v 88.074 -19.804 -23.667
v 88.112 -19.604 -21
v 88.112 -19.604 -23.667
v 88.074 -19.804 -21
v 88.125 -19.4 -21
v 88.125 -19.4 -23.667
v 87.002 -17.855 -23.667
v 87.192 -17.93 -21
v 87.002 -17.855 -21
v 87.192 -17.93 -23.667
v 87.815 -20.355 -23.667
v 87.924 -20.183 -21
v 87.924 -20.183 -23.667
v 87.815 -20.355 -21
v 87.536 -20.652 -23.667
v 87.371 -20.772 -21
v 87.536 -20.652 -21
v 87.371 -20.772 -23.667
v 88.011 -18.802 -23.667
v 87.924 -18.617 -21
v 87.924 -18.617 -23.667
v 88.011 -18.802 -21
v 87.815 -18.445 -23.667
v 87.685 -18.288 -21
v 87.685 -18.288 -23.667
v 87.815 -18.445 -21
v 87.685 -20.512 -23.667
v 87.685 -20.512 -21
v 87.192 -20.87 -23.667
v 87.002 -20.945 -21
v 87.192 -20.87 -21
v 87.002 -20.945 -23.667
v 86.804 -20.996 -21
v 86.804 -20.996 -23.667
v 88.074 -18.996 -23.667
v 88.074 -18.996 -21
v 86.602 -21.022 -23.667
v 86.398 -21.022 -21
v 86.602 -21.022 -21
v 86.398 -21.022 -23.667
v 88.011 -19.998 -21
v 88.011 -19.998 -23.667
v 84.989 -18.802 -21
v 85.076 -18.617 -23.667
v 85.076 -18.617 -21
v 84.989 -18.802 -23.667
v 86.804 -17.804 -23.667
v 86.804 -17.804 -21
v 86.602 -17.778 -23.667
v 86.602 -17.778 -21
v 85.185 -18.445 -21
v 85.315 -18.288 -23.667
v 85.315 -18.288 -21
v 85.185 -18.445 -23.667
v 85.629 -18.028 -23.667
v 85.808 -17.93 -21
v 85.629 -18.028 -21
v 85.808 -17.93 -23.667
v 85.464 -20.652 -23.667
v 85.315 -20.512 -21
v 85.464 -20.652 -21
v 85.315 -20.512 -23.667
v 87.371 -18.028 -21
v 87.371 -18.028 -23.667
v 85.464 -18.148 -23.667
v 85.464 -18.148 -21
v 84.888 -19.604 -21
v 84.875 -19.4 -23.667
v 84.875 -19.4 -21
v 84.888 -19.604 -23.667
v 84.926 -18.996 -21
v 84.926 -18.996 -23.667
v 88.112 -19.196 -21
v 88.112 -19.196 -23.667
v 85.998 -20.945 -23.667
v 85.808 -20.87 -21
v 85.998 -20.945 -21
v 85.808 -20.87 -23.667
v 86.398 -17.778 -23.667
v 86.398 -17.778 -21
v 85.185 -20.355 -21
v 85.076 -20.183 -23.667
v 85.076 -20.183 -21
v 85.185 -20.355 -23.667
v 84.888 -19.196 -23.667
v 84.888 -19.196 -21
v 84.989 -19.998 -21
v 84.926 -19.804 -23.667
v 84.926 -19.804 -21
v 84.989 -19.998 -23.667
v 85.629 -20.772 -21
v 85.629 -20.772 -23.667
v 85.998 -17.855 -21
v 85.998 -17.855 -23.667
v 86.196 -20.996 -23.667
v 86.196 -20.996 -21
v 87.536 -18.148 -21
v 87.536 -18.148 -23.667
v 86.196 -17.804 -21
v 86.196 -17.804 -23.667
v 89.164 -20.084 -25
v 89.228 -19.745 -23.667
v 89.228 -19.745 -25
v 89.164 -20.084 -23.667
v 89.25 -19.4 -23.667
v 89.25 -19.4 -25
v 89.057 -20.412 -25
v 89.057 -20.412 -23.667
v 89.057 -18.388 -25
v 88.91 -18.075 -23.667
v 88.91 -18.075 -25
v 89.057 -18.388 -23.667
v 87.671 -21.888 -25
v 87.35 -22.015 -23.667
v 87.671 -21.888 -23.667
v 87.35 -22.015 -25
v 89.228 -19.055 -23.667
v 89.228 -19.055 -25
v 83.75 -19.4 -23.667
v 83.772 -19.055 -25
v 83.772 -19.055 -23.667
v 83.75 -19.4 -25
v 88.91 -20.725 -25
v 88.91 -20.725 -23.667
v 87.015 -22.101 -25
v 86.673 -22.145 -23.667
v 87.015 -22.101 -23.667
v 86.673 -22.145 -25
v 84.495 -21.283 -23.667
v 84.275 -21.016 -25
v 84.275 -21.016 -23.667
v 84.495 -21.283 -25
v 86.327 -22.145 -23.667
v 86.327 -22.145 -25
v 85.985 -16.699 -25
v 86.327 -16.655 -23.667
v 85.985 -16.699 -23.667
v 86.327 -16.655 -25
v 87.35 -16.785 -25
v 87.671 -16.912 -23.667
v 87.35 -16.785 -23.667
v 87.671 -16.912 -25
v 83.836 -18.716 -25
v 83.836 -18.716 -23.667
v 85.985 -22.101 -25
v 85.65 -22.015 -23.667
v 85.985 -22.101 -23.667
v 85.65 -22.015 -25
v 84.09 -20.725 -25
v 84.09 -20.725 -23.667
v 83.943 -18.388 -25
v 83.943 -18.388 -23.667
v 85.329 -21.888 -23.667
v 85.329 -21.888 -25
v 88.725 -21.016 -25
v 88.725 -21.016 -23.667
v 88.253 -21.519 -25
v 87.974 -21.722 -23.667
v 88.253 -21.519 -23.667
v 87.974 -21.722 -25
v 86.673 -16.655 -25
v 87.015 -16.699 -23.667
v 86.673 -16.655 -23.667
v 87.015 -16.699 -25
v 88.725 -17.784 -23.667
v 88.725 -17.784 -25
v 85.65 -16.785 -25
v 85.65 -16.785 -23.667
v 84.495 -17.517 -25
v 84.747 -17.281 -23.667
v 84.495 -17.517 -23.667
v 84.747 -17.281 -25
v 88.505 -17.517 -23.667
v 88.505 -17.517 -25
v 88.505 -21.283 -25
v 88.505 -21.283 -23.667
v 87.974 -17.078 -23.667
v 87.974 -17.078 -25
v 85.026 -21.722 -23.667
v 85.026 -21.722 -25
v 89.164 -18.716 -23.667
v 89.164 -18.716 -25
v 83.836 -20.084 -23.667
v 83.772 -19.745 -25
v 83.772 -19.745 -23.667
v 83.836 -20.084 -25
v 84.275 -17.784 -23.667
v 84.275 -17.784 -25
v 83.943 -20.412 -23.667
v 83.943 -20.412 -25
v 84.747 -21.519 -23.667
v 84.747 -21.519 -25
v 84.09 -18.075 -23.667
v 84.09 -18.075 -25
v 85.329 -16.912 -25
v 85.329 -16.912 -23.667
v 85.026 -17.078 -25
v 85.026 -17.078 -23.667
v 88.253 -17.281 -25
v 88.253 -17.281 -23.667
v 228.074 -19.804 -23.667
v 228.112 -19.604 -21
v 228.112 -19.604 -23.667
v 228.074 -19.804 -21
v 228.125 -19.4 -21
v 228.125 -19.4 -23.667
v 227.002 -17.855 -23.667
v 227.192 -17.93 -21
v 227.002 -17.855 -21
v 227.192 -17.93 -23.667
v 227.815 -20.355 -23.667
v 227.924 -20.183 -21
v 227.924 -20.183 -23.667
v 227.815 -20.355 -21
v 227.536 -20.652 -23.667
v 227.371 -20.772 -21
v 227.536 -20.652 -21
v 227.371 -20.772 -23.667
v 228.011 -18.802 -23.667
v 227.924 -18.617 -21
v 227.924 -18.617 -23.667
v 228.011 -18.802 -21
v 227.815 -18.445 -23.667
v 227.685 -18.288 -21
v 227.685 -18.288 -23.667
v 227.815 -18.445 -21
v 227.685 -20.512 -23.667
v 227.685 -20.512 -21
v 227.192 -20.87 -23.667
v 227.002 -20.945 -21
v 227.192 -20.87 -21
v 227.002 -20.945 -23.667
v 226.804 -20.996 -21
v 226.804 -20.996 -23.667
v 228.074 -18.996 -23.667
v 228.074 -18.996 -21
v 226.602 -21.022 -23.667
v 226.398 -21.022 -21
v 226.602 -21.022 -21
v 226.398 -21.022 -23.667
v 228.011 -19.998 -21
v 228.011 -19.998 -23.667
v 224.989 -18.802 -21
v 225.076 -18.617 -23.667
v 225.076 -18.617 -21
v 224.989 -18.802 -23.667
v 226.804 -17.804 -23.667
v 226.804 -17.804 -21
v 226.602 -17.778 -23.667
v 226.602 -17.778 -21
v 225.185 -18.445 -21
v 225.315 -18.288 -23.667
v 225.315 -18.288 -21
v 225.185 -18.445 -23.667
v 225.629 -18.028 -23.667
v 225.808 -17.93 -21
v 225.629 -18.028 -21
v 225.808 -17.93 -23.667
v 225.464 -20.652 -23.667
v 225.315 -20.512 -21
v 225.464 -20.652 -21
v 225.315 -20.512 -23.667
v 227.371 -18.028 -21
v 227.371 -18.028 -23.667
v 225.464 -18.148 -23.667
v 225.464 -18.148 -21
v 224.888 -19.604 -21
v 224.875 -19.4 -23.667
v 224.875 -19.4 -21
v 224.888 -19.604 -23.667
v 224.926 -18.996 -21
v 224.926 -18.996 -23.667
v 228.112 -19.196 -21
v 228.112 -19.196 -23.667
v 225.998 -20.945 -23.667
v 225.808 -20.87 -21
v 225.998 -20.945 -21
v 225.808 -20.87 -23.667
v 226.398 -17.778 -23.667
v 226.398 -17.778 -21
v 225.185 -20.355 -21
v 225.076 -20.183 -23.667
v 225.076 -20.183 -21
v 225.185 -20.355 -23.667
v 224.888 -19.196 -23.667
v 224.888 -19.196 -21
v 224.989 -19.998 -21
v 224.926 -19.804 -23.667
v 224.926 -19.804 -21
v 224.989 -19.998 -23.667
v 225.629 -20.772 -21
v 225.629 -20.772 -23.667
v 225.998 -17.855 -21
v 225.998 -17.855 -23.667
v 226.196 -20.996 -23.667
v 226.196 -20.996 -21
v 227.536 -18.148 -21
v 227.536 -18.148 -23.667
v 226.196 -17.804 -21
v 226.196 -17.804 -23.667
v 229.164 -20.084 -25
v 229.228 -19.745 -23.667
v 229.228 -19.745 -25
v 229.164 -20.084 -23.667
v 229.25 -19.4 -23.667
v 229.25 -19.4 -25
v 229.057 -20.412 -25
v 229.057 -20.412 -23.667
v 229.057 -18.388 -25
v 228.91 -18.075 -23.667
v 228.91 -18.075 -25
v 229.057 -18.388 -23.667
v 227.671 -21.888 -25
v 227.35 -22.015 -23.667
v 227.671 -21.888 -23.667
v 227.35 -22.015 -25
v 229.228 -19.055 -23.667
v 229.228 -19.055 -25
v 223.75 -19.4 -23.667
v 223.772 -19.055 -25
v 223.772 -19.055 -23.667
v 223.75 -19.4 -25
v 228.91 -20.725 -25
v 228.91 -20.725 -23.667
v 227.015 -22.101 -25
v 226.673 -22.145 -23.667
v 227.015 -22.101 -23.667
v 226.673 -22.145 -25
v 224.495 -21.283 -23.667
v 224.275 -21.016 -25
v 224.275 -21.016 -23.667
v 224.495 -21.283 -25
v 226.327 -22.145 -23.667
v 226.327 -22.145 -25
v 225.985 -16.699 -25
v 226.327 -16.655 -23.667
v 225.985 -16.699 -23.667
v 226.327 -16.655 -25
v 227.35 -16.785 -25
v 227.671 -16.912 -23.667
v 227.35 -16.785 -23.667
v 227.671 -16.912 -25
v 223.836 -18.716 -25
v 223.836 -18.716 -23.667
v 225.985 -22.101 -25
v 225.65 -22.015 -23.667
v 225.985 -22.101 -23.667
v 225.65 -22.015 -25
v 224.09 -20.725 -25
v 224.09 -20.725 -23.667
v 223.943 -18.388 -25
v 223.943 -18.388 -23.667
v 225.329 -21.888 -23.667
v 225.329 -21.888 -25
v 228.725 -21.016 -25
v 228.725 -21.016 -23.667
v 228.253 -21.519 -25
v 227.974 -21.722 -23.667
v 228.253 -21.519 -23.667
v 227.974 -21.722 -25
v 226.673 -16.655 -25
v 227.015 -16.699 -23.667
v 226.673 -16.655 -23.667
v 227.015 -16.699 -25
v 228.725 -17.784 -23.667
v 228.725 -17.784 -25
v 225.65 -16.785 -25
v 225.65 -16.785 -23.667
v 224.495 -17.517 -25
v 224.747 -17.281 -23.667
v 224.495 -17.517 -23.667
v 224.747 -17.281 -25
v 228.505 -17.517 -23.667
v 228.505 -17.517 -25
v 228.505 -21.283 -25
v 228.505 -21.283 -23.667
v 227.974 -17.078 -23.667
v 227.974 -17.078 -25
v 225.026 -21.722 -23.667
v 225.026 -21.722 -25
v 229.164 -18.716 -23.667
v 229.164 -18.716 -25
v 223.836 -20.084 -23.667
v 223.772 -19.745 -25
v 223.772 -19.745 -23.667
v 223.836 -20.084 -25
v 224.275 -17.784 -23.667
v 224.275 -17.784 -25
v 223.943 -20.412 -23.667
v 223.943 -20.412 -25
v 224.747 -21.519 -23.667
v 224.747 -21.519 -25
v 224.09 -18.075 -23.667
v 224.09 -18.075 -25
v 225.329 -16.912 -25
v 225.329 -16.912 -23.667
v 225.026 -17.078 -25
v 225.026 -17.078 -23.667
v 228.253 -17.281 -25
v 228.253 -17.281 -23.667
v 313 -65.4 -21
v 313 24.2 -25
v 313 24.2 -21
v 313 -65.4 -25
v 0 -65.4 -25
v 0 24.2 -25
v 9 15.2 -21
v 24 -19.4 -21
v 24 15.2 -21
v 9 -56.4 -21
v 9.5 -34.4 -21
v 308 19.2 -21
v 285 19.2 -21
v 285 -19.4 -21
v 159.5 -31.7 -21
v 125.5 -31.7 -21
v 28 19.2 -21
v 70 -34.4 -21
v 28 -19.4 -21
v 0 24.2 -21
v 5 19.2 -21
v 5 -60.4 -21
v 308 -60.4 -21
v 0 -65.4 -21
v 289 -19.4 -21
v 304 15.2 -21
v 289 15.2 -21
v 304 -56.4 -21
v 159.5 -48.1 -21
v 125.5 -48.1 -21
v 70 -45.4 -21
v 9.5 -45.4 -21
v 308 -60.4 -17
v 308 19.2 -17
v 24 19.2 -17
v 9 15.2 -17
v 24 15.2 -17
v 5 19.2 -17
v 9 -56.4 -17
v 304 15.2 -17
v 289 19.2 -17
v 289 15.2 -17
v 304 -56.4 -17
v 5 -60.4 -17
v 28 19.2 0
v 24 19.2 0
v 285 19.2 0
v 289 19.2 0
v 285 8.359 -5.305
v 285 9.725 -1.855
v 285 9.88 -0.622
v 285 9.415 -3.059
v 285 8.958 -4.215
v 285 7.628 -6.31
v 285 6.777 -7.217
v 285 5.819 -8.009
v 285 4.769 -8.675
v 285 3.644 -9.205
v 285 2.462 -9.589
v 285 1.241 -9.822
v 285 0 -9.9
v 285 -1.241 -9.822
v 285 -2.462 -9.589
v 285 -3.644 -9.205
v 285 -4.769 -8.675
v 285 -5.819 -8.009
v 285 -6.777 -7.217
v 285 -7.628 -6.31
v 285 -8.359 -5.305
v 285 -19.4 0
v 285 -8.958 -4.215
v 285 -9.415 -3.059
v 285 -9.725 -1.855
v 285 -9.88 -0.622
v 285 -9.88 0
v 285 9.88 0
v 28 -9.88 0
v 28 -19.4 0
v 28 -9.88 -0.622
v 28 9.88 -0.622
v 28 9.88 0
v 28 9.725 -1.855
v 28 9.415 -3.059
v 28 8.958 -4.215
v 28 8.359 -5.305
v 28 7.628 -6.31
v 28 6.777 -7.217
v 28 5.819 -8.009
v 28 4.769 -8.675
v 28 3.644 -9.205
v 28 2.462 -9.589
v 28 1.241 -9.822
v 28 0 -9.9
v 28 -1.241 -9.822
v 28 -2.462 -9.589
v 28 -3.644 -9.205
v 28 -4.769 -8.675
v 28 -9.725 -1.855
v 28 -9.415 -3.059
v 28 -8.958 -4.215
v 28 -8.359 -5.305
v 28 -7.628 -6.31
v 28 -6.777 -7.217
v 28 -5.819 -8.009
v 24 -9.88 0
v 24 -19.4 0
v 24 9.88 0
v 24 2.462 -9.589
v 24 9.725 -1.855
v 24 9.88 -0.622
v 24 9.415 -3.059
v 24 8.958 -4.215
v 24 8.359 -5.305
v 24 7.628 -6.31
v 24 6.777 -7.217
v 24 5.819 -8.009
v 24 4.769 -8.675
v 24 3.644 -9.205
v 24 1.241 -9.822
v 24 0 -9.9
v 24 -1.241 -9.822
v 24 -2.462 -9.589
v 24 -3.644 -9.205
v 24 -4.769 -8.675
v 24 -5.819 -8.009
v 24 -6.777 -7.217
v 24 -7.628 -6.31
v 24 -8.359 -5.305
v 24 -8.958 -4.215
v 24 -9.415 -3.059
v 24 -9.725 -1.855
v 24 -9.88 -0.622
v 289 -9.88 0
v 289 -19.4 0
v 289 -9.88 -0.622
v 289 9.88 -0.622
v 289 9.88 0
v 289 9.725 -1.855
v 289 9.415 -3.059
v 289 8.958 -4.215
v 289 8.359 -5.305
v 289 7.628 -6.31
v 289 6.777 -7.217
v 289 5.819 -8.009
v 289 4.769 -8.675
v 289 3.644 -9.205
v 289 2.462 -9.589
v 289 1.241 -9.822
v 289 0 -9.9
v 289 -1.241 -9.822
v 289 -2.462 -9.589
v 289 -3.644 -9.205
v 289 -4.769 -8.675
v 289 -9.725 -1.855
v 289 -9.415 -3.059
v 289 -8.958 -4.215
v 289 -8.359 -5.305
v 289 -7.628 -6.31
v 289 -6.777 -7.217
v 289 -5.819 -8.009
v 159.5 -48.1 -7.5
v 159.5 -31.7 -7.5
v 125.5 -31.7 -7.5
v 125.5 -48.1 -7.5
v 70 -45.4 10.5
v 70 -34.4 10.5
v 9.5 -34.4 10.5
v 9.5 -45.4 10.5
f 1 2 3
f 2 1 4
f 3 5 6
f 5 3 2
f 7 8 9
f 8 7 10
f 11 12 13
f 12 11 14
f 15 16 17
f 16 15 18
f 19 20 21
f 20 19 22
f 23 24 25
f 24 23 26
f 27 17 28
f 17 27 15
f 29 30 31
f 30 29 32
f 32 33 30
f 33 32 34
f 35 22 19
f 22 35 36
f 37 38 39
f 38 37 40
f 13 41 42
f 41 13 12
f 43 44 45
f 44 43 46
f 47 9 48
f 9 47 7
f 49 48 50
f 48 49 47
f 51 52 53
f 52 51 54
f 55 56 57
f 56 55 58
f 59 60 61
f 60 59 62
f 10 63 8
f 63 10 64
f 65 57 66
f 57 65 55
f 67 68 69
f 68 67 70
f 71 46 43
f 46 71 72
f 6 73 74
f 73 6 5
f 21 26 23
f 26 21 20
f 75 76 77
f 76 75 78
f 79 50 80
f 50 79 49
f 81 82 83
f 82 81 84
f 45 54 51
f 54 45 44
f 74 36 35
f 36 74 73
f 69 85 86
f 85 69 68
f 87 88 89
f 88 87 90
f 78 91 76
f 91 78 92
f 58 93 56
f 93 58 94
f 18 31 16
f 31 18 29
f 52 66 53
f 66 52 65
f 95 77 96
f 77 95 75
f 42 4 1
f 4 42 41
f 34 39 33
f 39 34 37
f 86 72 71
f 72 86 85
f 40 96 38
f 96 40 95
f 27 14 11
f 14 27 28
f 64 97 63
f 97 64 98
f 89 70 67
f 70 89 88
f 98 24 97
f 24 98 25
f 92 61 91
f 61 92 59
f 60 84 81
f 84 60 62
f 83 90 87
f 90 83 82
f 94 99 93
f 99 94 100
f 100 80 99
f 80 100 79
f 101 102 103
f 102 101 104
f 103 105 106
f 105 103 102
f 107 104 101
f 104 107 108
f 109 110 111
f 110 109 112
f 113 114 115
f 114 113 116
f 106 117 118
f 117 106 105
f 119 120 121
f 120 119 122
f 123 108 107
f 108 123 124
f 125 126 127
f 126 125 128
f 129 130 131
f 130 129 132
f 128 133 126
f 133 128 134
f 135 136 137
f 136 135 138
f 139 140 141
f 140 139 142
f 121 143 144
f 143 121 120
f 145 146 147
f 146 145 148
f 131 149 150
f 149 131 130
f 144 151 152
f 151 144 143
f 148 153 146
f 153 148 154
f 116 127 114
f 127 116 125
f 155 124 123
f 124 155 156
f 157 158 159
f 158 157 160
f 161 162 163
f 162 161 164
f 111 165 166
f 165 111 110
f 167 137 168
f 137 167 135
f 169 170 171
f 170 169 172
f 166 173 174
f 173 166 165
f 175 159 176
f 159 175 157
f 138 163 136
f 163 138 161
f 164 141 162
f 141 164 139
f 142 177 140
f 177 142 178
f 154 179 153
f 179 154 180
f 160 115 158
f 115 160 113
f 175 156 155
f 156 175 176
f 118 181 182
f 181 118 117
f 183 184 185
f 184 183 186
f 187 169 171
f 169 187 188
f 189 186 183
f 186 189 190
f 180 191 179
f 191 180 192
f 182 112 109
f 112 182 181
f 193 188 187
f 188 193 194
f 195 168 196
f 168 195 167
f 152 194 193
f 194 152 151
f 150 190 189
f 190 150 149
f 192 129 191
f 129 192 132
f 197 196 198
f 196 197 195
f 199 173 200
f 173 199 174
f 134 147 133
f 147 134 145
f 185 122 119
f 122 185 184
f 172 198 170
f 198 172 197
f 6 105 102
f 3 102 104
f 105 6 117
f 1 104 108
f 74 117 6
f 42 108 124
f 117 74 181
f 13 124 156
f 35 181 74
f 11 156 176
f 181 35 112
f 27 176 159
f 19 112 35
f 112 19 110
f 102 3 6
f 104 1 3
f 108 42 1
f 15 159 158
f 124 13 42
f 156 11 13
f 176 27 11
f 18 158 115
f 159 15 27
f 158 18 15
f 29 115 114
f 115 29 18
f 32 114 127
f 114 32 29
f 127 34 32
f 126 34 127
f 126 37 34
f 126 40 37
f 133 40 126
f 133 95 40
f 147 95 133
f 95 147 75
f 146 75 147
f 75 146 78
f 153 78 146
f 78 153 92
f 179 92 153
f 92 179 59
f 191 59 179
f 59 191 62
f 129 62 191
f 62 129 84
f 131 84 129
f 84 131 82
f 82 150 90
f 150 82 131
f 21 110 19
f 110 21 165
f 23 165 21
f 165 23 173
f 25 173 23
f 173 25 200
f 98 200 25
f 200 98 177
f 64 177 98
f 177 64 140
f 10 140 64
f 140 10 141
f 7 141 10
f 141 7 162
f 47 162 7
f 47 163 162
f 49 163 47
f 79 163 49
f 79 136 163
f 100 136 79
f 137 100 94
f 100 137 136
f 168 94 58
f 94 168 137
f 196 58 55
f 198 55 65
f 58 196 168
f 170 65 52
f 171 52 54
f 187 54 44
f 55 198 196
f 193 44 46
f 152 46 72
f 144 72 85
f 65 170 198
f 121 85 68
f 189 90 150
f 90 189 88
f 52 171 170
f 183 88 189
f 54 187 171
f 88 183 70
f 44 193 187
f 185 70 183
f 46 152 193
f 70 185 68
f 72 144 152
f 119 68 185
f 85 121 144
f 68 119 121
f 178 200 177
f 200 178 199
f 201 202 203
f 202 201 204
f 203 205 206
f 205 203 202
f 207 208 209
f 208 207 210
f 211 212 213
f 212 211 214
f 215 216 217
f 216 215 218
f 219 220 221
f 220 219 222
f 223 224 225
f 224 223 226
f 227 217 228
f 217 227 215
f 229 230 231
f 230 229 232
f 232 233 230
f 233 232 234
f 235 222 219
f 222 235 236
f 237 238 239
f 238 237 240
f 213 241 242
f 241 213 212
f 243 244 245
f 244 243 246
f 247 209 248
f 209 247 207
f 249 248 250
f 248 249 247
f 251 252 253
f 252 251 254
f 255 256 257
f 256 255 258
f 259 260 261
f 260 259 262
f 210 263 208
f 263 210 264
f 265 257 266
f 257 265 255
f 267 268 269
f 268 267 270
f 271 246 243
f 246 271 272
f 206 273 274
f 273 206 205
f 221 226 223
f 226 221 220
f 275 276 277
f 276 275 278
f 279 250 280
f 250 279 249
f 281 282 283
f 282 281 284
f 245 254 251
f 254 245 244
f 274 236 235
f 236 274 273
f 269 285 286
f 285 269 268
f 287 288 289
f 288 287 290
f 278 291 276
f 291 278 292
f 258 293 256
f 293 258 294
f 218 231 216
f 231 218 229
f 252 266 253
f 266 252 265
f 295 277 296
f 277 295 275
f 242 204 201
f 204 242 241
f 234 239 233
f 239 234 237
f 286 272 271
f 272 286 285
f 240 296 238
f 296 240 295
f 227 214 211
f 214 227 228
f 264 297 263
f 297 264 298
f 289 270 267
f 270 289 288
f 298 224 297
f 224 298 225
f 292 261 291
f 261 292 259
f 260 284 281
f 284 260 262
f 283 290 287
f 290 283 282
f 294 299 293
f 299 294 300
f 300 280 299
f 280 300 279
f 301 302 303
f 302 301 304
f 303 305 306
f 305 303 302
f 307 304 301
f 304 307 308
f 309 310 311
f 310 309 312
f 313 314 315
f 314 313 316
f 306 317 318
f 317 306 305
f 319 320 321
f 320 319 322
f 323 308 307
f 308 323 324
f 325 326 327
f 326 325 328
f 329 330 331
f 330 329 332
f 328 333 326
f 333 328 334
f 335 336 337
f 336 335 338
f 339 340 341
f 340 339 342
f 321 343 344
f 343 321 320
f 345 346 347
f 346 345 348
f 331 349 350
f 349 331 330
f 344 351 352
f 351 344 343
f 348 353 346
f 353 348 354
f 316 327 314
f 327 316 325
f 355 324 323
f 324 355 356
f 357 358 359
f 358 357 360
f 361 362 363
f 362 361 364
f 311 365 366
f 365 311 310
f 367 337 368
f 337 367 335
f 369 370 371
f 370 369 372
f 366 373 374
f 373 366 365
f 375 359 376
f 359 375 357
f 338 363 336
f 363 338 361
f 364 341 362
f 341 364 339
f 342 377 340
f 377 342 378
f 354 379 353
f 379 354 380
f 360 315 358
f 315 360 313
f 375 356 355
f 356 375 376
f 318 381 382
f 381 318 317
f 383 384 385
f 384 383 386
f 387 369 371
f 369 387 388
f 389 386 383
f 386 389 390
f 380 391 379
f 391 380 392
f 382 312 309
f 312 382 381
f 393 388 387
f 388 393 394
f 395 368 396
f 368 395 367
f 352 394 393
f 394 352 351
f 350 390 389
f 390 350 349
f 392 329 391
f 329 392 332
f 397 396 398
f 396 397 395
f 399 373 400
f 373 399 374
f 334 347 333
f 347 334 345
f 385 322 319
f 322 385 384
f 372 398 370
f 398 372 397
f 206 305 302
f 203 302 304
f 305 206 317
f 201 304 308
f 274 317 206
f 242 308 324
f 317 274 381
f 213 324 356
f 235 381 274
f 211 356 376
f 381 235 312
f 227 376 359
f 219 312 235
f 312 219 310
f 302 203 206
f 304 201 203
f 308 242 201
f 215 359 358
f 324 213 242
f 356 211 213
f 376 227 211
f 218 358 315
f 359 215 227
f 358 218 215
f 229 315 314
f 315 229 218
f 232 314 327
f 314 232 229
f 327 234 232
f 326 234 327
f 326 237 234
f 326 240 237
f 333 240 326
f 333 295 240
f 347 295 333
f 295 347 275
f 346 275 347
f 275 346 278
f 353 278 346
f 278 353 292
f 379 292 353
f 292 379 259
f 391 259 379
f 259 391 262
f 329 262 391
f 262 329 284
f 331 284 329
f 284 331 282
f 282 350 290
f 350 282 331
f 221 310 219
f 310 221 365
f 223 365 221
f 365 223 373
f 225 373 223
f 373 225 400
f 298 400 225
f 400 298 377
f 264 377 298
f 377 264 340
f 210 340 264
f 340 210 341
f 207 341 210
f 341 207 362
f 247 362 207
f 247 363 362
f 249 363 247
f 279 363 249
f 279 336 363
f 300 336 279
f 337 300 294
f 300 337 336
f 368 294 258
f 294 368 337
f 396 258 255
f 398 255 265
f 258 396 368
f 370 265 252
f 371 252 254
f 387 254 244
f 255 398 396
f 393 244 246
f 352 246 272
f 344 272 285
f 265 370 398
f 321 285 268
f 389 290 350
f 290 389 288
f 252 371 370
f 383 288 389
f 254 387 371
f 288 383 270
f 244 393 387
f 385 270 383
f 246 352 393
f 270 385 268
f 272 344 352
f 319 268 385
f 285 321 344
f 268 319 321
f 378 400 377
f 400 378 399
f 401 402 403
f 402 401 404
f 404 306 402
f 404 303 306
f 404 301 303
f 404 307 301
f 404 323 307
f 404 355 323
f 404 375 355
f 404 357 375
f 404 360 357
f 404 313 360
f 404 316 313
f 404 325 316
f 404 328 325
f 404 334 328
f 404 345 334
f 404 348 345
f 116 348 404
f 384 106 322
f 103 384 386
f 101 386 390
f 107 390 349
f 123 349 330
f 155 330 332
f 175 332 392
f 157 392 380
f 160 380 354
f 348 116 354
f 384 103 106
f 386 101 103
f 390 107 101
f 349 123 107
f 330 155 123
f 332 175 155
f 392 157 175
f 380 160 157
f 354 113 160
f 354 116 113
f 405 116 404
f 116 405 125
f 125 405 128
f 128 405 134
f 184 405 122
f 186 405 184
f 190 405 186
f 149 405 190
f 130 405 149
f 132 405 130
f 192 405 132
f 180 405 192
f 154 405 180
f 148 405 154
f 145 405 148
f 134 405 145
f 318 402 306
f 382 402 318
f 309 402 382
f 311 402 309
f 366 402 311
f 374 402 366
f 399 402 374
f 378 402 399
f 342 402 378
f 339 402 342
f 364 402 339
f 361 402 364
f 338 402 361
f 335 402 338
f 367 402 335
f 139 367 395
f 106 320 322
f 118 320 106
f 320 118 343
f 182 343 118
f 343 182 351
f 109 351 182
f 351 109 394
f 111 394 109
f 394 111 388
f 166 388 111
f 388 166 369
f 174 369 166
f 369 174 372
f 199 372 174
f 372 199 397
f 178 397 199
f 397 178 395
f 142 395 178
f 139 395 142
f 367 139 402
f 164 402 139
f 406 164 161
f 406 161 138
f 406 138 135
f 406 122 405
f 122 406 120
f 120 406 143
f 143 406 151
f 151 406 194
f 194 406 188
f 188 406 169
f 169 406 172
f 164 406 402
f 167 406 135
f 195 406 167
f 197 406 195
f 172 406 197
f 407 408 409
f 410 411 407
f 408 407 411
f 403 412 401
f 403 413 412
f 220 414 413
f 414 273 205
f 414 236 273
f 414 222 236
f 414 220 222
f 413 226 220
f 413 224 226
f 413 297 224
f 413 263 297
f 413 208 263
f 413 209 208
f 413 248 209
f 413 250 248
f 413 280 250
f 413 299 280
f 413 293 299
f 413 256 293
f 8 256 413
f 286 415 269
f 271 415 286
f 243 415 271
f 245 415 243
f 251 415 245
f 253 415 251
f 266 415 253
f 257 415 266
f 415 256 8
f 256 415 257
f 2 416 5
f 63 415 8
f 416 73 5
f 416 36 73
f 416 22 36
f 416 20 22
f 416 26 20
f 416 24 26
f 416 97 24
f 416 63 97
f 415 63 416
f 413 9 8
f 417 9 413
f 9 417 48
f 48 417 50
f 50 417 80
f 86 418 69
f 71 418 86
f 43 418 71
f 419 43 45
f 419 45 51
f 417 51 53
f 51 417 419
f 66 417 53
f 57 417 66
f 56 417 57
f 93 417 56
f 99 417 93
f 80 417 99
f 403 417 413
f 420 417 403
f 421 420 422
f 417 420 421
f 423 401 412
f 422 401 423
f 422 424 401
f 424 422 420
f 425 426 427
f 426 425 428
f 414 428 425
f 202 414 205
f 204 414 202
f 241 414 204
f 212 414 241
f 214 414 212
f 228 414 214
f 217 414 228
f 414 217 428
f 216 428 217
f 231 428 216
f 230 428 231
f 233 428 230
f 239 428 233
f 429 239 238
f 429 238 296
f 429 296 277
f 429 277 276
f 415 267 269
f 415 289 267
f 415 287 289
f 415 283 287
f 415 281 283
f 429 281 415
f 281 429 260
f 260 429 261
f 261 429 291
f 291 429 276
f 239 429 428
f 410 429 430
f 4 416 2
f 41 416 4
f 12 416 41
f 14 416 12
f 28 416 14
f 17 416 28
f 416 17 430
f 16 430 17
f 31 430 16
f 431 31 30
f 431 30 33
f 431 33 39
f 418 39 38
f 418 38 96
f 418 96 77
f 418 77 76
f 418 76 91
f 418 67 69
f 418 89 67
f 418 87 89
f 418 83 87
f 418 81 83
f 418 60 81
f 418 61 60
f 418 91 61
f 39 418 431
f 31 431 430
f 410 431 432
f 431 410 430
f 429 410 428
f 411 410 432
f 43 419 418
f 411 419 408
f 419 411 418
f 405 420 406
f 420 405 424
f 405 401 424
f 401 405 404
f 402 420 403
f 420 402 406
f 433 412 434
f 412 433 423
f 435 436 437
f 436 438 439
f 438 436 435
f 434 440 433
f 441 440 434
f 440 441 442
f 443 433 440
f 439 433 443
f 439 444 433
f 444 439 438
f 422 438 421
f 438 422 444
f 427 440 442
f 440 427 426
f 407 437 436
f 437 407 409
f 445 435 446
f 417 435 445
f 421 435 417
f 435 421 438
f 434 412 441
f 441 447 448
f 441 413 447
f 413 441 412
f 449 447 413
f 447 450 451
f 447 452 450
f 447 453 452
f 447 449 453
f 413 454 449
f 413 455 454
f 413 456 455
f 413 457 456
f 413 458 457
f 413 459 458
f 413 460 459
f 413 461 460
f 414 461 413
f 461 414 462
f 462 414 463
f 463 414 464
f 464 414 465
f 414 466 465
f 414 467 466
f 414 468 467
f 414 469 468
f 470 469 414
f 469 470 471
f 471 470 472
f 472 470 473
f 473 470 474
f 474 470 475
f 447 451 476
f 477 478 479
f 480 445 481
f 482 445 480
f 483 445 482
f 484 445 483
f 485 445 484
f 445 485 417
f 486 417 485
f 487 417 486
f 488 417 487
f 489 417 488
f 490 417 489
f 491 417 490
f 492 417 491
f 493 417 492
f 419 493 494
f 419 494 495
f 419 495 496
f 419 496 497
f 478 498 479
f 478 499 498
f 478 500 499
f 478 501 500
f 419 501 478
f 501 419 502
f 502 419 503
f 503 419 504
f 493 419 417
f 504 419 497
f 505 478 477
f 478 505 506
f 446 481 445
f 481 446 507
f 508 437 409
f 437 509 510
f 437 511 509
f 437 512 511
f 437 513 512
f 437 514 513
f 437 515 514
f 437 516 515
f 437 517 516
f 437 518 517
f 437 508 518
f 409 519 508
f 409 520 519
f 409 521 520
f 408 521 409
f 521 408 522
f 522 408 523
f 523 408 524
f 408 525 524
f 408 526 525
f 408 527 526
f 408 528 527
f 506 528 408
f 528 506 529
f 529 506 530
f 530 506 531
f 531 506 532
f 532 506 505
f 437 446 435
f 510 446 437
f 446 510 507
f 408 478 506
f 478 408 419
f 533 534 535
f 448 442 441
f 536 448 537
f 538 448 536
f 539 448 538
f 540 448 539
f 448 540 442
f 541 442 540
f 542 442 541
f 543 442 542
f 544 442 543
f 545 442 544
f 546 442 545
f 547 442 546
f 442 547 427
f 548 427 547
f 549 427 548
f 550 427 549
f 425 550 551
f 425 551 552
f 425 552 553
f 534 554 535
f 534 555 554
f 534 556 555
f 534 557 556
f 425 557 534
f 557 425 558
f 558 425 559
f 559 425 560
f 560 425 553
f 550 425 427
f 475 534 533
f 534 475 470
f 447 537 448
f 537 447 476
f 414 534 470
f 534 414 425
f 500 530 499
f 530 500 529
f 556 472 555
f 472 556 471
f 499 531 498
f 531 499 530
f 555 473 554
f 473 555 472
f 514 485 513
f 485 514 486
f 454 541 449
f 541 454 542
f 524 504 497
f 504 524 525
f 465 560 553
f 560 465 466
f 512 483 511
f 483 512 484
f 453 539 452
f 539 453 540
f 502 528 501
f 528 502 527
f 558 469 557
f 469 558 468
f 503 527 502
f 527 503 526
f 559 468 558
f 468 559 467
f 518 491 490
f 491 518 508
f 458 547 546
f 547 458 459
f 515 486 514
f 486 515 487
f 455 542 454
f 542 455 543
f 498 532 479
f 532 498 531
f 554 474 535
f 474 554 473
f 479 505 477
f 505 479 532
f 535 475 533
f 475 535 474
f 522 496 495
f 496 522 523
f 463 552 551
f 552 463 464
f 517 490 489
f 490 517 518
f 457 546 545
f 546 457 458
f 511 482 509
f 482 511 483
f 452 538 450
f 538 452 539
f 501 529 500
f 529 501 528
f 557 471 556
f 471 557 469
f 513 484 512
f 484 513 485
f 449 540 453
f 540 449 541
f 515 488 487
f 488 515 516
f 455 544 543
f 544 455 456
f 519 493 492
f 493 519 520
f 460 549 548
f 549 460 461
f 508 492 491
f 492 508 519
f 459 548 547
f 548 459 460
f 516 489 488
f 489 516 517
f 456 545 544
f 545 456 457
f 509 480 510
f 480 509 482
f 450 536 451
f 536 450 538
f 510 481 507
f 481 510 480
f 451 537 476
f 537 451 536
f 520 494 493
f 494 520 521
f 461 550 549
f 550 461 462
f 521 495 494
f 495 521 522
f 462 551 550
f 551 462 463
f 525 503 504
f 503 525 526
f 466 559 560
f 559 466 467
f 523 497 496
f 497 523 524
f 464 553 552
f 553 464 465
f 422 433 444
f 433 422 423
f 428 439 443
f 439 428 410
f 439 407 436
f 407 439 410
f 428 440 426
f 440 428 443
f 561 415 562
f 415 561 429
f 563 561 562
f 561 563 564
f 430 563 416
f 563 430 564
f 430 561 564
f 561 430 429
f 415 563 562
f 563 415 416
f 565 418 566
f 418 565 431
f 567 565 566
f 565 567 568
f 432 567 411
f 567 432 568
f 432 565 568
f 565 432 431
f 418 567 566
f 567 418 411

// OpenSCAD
// file: componentes.scad
//    # Released under MIT License
//
//    Copyright (c) 2020 Matias H. Senger
//
//    Permission is hereby granted, free of charge, to any person obtaining a copy of this software and associated documentation files (the "Software"), to deal in the Software without restriction, including without limitation the rights to use, copy, modify, merge, publish, distribute, sublicense, and/or sell copies of the Software, and to permit persons to whom the Software is furnished to do so, subject to the following conditions:
//
//    The above copyright notice and this permission notice shall be included in all copies or substantial portions of the Software.
//
//    THE SOFTWARE IS PROVIDED "AS IS", WITHOUT WARRANTY OF ANY KIND, EXPRESS OR IMPLIED, INCLUDING BUT NOT LIMITED TO THE WARRANTIES OF MERCHANTABILITY, FITNESS FOR A PARTICULAR PURPOSE AND NONINFRINGEMENT. IN NO EVENT SHALL THE AUTHORS OR COPYRIGHT HOLDERS BE LIABLE FOR ANY CLAIM, DAMAGES OR OTHER LIABILITY, WHETHER IN AN ACTION OF CONTRACT, TORT OR OTHERWISE, ARISING FROM, OUT OF OR IN CONNECTION WITH THE SOFTWARE OR THE USE OR OTHER DEALINGS IN THE SOFTWARE.

function diametro_tubo_germicida() = 18.8;
function longitud_tubo_germicida() = 265+2*11+2*7;

module tubo_germicida() {
    LONGITUD_VIDRIO = 265;
    DIAMETRO_VIDRIO = 18.8;
    LONGITUD_METAL = 11;
    DIAMETRO_METAL = 15;
    LONGITUD_PIN = 7;
    DIAMETRO_PIN = 2.5;
    SEPARACION_PIN = 4.5;
    module pin() {
        cylinder(h=LONGITUD_PIN, d=DIAMETRO_PIN);
    }
    module metalsito() {
        color([1,1,1]*.8)
        cylinder(h=LONGITUD_METAL, d=DIAMETRO_METAL);
    }
    module tubo_de_vidrio() {
        color([1,1,1], alpha=.4)
        cylinder(h=LONGITUD_VIDRIO, d=DIAMETRO_VIDRIO);
    }
    
    translate([-SEPARACION_PIN/2,0,0])
        pin();
    translate([SEPARACION_PIN/2,0,0])
        pin();
    translate([-SEPARACION_PIN/2,0,2*LONGITUD_METAL+LONGITUD_VIDRIO+LONGITUD_PIN])
        pin();
    translate([SEPARACION_PIN/2,0,2*LONGITUD_METAL+LONGITUD_VIDRIO+LONGITUD_PIN])
        pin();
    
    translate([0,0,LONGITUD_METAL+LONGITUD_PIN])
        tubo_de_vidrio();

    translate([0,0,LONGITUD_METAL+LONGITUD_VIDRIO+LONGITUD_PIN])
        metalsito();
    translate([0,0,LONGITUD_PIN])
        metalsito();
}

function dimensiones_reactancia() = [85,41,28];

module reactancia() {
    module ranura() {
        translate([0,0,-1]) {
            cube([9-4.5/2,4.5,3]);
            translate([9-4.5/2,4.5/2,0])
                cylinder(h=3,d=4.5);
        }
    }
    module agujero() {
        translate([0,0,-1])
            cylinder(h=3,d=5);
    }
    color([1,1,1]) {
        difference() {
            cube([85,41,1]);
            translate([0,41/2-4.5/2,0])
                ranura();
            translate([85,41/2+4.5/2,0])
                rotate(a=180,v=[0,0,1])
                    ranura();
            translate([76.5+5/2,5+5/2,0])
                agujero();
            translate([76.5+5/2,41-5-5/2,0])
                agujero();
        }
        translate([16.5,0,0])
            cube([35,41,28]);
        translate([63,41/2-21/2,3])
            cube([18,21,12]);
        translate([51,(41-31)/2,3])
            cube([12,31,25]);
        translate([16.5-9,(41-31)/2,3])
            cube([9,31,22]);
    }
}

module arrancador() {
    color([.3,.4,1], alpha=.5)
        cylinder(h=35,d=21);
}

module zocalo_arrancador() {
    color([1,1,1]) {
        difference() {
            cube([45,9,12.5]);
            translate([45/2-37/2,9/2,-1])
                cylinder(h=15,d=4);
            translate([45/2+37/2,9/2,-1])
                cylinder(h=15,d=4);
        }
        translate([45/2,9/2,0])
            cylinder(h=12.5,d=27);
    }
}

module zocalo_con_arrancador() {
    zocalo_arrancador();
    translate([45/2,9/2,42-35])
        arrancador();
}

function dimensiones_zocalo_con_arrancador() = [45,27,42];
// main file
//    # Released under MIT License
//
//    Copyright (c) 2020 Matias H. Senger
//
//    Permission is hereby granted, free of charge, to any person obtaining a copy of this software and associated documentation files (the "Software"), to deal in the Software without restriction, including without limitation the rights to use, copy, modify, merge, publish, distribute, sublicense, and/or sell copies of the Software, and to permit persons to whom the Software is furnished to do so, subject to the following conditions:
//
//    The above copyright notice and this permission notice shall be included in all copies or substantial portions of the Software.
//
//    THE SOFTWARE IS PROVIDED "AS IS", WITHOUT WARRANTY OF ANY KIND, EXPRESS OR IMPLIED, INCLUDING BUT NOT LIMITED TO THE WARRANTIES OF MERCHANTABILITY, FITNESS FOR A PARTICULAR PURPOSE AND NONINFRINGEMENT. IN NO EVENT SHALL THE AUTHORS OR COPYRIGHT HOLDERS BE LIABLE FOR ANY CLAIM, DAMAGES OR OTHER LIABILITY, WHETHER IN AN ACTION OF CONTRACT, TORT OR OTHERWISE, ARISING FROM, OUT OF OR IN CONNECTION WITH THE SOFTWARE OR THE USE OR OTHER DEALINGS IN THE SOFTWARE.

use <piezas.scad>

rotate(a=180,v=[1,0,0]) tapa();
